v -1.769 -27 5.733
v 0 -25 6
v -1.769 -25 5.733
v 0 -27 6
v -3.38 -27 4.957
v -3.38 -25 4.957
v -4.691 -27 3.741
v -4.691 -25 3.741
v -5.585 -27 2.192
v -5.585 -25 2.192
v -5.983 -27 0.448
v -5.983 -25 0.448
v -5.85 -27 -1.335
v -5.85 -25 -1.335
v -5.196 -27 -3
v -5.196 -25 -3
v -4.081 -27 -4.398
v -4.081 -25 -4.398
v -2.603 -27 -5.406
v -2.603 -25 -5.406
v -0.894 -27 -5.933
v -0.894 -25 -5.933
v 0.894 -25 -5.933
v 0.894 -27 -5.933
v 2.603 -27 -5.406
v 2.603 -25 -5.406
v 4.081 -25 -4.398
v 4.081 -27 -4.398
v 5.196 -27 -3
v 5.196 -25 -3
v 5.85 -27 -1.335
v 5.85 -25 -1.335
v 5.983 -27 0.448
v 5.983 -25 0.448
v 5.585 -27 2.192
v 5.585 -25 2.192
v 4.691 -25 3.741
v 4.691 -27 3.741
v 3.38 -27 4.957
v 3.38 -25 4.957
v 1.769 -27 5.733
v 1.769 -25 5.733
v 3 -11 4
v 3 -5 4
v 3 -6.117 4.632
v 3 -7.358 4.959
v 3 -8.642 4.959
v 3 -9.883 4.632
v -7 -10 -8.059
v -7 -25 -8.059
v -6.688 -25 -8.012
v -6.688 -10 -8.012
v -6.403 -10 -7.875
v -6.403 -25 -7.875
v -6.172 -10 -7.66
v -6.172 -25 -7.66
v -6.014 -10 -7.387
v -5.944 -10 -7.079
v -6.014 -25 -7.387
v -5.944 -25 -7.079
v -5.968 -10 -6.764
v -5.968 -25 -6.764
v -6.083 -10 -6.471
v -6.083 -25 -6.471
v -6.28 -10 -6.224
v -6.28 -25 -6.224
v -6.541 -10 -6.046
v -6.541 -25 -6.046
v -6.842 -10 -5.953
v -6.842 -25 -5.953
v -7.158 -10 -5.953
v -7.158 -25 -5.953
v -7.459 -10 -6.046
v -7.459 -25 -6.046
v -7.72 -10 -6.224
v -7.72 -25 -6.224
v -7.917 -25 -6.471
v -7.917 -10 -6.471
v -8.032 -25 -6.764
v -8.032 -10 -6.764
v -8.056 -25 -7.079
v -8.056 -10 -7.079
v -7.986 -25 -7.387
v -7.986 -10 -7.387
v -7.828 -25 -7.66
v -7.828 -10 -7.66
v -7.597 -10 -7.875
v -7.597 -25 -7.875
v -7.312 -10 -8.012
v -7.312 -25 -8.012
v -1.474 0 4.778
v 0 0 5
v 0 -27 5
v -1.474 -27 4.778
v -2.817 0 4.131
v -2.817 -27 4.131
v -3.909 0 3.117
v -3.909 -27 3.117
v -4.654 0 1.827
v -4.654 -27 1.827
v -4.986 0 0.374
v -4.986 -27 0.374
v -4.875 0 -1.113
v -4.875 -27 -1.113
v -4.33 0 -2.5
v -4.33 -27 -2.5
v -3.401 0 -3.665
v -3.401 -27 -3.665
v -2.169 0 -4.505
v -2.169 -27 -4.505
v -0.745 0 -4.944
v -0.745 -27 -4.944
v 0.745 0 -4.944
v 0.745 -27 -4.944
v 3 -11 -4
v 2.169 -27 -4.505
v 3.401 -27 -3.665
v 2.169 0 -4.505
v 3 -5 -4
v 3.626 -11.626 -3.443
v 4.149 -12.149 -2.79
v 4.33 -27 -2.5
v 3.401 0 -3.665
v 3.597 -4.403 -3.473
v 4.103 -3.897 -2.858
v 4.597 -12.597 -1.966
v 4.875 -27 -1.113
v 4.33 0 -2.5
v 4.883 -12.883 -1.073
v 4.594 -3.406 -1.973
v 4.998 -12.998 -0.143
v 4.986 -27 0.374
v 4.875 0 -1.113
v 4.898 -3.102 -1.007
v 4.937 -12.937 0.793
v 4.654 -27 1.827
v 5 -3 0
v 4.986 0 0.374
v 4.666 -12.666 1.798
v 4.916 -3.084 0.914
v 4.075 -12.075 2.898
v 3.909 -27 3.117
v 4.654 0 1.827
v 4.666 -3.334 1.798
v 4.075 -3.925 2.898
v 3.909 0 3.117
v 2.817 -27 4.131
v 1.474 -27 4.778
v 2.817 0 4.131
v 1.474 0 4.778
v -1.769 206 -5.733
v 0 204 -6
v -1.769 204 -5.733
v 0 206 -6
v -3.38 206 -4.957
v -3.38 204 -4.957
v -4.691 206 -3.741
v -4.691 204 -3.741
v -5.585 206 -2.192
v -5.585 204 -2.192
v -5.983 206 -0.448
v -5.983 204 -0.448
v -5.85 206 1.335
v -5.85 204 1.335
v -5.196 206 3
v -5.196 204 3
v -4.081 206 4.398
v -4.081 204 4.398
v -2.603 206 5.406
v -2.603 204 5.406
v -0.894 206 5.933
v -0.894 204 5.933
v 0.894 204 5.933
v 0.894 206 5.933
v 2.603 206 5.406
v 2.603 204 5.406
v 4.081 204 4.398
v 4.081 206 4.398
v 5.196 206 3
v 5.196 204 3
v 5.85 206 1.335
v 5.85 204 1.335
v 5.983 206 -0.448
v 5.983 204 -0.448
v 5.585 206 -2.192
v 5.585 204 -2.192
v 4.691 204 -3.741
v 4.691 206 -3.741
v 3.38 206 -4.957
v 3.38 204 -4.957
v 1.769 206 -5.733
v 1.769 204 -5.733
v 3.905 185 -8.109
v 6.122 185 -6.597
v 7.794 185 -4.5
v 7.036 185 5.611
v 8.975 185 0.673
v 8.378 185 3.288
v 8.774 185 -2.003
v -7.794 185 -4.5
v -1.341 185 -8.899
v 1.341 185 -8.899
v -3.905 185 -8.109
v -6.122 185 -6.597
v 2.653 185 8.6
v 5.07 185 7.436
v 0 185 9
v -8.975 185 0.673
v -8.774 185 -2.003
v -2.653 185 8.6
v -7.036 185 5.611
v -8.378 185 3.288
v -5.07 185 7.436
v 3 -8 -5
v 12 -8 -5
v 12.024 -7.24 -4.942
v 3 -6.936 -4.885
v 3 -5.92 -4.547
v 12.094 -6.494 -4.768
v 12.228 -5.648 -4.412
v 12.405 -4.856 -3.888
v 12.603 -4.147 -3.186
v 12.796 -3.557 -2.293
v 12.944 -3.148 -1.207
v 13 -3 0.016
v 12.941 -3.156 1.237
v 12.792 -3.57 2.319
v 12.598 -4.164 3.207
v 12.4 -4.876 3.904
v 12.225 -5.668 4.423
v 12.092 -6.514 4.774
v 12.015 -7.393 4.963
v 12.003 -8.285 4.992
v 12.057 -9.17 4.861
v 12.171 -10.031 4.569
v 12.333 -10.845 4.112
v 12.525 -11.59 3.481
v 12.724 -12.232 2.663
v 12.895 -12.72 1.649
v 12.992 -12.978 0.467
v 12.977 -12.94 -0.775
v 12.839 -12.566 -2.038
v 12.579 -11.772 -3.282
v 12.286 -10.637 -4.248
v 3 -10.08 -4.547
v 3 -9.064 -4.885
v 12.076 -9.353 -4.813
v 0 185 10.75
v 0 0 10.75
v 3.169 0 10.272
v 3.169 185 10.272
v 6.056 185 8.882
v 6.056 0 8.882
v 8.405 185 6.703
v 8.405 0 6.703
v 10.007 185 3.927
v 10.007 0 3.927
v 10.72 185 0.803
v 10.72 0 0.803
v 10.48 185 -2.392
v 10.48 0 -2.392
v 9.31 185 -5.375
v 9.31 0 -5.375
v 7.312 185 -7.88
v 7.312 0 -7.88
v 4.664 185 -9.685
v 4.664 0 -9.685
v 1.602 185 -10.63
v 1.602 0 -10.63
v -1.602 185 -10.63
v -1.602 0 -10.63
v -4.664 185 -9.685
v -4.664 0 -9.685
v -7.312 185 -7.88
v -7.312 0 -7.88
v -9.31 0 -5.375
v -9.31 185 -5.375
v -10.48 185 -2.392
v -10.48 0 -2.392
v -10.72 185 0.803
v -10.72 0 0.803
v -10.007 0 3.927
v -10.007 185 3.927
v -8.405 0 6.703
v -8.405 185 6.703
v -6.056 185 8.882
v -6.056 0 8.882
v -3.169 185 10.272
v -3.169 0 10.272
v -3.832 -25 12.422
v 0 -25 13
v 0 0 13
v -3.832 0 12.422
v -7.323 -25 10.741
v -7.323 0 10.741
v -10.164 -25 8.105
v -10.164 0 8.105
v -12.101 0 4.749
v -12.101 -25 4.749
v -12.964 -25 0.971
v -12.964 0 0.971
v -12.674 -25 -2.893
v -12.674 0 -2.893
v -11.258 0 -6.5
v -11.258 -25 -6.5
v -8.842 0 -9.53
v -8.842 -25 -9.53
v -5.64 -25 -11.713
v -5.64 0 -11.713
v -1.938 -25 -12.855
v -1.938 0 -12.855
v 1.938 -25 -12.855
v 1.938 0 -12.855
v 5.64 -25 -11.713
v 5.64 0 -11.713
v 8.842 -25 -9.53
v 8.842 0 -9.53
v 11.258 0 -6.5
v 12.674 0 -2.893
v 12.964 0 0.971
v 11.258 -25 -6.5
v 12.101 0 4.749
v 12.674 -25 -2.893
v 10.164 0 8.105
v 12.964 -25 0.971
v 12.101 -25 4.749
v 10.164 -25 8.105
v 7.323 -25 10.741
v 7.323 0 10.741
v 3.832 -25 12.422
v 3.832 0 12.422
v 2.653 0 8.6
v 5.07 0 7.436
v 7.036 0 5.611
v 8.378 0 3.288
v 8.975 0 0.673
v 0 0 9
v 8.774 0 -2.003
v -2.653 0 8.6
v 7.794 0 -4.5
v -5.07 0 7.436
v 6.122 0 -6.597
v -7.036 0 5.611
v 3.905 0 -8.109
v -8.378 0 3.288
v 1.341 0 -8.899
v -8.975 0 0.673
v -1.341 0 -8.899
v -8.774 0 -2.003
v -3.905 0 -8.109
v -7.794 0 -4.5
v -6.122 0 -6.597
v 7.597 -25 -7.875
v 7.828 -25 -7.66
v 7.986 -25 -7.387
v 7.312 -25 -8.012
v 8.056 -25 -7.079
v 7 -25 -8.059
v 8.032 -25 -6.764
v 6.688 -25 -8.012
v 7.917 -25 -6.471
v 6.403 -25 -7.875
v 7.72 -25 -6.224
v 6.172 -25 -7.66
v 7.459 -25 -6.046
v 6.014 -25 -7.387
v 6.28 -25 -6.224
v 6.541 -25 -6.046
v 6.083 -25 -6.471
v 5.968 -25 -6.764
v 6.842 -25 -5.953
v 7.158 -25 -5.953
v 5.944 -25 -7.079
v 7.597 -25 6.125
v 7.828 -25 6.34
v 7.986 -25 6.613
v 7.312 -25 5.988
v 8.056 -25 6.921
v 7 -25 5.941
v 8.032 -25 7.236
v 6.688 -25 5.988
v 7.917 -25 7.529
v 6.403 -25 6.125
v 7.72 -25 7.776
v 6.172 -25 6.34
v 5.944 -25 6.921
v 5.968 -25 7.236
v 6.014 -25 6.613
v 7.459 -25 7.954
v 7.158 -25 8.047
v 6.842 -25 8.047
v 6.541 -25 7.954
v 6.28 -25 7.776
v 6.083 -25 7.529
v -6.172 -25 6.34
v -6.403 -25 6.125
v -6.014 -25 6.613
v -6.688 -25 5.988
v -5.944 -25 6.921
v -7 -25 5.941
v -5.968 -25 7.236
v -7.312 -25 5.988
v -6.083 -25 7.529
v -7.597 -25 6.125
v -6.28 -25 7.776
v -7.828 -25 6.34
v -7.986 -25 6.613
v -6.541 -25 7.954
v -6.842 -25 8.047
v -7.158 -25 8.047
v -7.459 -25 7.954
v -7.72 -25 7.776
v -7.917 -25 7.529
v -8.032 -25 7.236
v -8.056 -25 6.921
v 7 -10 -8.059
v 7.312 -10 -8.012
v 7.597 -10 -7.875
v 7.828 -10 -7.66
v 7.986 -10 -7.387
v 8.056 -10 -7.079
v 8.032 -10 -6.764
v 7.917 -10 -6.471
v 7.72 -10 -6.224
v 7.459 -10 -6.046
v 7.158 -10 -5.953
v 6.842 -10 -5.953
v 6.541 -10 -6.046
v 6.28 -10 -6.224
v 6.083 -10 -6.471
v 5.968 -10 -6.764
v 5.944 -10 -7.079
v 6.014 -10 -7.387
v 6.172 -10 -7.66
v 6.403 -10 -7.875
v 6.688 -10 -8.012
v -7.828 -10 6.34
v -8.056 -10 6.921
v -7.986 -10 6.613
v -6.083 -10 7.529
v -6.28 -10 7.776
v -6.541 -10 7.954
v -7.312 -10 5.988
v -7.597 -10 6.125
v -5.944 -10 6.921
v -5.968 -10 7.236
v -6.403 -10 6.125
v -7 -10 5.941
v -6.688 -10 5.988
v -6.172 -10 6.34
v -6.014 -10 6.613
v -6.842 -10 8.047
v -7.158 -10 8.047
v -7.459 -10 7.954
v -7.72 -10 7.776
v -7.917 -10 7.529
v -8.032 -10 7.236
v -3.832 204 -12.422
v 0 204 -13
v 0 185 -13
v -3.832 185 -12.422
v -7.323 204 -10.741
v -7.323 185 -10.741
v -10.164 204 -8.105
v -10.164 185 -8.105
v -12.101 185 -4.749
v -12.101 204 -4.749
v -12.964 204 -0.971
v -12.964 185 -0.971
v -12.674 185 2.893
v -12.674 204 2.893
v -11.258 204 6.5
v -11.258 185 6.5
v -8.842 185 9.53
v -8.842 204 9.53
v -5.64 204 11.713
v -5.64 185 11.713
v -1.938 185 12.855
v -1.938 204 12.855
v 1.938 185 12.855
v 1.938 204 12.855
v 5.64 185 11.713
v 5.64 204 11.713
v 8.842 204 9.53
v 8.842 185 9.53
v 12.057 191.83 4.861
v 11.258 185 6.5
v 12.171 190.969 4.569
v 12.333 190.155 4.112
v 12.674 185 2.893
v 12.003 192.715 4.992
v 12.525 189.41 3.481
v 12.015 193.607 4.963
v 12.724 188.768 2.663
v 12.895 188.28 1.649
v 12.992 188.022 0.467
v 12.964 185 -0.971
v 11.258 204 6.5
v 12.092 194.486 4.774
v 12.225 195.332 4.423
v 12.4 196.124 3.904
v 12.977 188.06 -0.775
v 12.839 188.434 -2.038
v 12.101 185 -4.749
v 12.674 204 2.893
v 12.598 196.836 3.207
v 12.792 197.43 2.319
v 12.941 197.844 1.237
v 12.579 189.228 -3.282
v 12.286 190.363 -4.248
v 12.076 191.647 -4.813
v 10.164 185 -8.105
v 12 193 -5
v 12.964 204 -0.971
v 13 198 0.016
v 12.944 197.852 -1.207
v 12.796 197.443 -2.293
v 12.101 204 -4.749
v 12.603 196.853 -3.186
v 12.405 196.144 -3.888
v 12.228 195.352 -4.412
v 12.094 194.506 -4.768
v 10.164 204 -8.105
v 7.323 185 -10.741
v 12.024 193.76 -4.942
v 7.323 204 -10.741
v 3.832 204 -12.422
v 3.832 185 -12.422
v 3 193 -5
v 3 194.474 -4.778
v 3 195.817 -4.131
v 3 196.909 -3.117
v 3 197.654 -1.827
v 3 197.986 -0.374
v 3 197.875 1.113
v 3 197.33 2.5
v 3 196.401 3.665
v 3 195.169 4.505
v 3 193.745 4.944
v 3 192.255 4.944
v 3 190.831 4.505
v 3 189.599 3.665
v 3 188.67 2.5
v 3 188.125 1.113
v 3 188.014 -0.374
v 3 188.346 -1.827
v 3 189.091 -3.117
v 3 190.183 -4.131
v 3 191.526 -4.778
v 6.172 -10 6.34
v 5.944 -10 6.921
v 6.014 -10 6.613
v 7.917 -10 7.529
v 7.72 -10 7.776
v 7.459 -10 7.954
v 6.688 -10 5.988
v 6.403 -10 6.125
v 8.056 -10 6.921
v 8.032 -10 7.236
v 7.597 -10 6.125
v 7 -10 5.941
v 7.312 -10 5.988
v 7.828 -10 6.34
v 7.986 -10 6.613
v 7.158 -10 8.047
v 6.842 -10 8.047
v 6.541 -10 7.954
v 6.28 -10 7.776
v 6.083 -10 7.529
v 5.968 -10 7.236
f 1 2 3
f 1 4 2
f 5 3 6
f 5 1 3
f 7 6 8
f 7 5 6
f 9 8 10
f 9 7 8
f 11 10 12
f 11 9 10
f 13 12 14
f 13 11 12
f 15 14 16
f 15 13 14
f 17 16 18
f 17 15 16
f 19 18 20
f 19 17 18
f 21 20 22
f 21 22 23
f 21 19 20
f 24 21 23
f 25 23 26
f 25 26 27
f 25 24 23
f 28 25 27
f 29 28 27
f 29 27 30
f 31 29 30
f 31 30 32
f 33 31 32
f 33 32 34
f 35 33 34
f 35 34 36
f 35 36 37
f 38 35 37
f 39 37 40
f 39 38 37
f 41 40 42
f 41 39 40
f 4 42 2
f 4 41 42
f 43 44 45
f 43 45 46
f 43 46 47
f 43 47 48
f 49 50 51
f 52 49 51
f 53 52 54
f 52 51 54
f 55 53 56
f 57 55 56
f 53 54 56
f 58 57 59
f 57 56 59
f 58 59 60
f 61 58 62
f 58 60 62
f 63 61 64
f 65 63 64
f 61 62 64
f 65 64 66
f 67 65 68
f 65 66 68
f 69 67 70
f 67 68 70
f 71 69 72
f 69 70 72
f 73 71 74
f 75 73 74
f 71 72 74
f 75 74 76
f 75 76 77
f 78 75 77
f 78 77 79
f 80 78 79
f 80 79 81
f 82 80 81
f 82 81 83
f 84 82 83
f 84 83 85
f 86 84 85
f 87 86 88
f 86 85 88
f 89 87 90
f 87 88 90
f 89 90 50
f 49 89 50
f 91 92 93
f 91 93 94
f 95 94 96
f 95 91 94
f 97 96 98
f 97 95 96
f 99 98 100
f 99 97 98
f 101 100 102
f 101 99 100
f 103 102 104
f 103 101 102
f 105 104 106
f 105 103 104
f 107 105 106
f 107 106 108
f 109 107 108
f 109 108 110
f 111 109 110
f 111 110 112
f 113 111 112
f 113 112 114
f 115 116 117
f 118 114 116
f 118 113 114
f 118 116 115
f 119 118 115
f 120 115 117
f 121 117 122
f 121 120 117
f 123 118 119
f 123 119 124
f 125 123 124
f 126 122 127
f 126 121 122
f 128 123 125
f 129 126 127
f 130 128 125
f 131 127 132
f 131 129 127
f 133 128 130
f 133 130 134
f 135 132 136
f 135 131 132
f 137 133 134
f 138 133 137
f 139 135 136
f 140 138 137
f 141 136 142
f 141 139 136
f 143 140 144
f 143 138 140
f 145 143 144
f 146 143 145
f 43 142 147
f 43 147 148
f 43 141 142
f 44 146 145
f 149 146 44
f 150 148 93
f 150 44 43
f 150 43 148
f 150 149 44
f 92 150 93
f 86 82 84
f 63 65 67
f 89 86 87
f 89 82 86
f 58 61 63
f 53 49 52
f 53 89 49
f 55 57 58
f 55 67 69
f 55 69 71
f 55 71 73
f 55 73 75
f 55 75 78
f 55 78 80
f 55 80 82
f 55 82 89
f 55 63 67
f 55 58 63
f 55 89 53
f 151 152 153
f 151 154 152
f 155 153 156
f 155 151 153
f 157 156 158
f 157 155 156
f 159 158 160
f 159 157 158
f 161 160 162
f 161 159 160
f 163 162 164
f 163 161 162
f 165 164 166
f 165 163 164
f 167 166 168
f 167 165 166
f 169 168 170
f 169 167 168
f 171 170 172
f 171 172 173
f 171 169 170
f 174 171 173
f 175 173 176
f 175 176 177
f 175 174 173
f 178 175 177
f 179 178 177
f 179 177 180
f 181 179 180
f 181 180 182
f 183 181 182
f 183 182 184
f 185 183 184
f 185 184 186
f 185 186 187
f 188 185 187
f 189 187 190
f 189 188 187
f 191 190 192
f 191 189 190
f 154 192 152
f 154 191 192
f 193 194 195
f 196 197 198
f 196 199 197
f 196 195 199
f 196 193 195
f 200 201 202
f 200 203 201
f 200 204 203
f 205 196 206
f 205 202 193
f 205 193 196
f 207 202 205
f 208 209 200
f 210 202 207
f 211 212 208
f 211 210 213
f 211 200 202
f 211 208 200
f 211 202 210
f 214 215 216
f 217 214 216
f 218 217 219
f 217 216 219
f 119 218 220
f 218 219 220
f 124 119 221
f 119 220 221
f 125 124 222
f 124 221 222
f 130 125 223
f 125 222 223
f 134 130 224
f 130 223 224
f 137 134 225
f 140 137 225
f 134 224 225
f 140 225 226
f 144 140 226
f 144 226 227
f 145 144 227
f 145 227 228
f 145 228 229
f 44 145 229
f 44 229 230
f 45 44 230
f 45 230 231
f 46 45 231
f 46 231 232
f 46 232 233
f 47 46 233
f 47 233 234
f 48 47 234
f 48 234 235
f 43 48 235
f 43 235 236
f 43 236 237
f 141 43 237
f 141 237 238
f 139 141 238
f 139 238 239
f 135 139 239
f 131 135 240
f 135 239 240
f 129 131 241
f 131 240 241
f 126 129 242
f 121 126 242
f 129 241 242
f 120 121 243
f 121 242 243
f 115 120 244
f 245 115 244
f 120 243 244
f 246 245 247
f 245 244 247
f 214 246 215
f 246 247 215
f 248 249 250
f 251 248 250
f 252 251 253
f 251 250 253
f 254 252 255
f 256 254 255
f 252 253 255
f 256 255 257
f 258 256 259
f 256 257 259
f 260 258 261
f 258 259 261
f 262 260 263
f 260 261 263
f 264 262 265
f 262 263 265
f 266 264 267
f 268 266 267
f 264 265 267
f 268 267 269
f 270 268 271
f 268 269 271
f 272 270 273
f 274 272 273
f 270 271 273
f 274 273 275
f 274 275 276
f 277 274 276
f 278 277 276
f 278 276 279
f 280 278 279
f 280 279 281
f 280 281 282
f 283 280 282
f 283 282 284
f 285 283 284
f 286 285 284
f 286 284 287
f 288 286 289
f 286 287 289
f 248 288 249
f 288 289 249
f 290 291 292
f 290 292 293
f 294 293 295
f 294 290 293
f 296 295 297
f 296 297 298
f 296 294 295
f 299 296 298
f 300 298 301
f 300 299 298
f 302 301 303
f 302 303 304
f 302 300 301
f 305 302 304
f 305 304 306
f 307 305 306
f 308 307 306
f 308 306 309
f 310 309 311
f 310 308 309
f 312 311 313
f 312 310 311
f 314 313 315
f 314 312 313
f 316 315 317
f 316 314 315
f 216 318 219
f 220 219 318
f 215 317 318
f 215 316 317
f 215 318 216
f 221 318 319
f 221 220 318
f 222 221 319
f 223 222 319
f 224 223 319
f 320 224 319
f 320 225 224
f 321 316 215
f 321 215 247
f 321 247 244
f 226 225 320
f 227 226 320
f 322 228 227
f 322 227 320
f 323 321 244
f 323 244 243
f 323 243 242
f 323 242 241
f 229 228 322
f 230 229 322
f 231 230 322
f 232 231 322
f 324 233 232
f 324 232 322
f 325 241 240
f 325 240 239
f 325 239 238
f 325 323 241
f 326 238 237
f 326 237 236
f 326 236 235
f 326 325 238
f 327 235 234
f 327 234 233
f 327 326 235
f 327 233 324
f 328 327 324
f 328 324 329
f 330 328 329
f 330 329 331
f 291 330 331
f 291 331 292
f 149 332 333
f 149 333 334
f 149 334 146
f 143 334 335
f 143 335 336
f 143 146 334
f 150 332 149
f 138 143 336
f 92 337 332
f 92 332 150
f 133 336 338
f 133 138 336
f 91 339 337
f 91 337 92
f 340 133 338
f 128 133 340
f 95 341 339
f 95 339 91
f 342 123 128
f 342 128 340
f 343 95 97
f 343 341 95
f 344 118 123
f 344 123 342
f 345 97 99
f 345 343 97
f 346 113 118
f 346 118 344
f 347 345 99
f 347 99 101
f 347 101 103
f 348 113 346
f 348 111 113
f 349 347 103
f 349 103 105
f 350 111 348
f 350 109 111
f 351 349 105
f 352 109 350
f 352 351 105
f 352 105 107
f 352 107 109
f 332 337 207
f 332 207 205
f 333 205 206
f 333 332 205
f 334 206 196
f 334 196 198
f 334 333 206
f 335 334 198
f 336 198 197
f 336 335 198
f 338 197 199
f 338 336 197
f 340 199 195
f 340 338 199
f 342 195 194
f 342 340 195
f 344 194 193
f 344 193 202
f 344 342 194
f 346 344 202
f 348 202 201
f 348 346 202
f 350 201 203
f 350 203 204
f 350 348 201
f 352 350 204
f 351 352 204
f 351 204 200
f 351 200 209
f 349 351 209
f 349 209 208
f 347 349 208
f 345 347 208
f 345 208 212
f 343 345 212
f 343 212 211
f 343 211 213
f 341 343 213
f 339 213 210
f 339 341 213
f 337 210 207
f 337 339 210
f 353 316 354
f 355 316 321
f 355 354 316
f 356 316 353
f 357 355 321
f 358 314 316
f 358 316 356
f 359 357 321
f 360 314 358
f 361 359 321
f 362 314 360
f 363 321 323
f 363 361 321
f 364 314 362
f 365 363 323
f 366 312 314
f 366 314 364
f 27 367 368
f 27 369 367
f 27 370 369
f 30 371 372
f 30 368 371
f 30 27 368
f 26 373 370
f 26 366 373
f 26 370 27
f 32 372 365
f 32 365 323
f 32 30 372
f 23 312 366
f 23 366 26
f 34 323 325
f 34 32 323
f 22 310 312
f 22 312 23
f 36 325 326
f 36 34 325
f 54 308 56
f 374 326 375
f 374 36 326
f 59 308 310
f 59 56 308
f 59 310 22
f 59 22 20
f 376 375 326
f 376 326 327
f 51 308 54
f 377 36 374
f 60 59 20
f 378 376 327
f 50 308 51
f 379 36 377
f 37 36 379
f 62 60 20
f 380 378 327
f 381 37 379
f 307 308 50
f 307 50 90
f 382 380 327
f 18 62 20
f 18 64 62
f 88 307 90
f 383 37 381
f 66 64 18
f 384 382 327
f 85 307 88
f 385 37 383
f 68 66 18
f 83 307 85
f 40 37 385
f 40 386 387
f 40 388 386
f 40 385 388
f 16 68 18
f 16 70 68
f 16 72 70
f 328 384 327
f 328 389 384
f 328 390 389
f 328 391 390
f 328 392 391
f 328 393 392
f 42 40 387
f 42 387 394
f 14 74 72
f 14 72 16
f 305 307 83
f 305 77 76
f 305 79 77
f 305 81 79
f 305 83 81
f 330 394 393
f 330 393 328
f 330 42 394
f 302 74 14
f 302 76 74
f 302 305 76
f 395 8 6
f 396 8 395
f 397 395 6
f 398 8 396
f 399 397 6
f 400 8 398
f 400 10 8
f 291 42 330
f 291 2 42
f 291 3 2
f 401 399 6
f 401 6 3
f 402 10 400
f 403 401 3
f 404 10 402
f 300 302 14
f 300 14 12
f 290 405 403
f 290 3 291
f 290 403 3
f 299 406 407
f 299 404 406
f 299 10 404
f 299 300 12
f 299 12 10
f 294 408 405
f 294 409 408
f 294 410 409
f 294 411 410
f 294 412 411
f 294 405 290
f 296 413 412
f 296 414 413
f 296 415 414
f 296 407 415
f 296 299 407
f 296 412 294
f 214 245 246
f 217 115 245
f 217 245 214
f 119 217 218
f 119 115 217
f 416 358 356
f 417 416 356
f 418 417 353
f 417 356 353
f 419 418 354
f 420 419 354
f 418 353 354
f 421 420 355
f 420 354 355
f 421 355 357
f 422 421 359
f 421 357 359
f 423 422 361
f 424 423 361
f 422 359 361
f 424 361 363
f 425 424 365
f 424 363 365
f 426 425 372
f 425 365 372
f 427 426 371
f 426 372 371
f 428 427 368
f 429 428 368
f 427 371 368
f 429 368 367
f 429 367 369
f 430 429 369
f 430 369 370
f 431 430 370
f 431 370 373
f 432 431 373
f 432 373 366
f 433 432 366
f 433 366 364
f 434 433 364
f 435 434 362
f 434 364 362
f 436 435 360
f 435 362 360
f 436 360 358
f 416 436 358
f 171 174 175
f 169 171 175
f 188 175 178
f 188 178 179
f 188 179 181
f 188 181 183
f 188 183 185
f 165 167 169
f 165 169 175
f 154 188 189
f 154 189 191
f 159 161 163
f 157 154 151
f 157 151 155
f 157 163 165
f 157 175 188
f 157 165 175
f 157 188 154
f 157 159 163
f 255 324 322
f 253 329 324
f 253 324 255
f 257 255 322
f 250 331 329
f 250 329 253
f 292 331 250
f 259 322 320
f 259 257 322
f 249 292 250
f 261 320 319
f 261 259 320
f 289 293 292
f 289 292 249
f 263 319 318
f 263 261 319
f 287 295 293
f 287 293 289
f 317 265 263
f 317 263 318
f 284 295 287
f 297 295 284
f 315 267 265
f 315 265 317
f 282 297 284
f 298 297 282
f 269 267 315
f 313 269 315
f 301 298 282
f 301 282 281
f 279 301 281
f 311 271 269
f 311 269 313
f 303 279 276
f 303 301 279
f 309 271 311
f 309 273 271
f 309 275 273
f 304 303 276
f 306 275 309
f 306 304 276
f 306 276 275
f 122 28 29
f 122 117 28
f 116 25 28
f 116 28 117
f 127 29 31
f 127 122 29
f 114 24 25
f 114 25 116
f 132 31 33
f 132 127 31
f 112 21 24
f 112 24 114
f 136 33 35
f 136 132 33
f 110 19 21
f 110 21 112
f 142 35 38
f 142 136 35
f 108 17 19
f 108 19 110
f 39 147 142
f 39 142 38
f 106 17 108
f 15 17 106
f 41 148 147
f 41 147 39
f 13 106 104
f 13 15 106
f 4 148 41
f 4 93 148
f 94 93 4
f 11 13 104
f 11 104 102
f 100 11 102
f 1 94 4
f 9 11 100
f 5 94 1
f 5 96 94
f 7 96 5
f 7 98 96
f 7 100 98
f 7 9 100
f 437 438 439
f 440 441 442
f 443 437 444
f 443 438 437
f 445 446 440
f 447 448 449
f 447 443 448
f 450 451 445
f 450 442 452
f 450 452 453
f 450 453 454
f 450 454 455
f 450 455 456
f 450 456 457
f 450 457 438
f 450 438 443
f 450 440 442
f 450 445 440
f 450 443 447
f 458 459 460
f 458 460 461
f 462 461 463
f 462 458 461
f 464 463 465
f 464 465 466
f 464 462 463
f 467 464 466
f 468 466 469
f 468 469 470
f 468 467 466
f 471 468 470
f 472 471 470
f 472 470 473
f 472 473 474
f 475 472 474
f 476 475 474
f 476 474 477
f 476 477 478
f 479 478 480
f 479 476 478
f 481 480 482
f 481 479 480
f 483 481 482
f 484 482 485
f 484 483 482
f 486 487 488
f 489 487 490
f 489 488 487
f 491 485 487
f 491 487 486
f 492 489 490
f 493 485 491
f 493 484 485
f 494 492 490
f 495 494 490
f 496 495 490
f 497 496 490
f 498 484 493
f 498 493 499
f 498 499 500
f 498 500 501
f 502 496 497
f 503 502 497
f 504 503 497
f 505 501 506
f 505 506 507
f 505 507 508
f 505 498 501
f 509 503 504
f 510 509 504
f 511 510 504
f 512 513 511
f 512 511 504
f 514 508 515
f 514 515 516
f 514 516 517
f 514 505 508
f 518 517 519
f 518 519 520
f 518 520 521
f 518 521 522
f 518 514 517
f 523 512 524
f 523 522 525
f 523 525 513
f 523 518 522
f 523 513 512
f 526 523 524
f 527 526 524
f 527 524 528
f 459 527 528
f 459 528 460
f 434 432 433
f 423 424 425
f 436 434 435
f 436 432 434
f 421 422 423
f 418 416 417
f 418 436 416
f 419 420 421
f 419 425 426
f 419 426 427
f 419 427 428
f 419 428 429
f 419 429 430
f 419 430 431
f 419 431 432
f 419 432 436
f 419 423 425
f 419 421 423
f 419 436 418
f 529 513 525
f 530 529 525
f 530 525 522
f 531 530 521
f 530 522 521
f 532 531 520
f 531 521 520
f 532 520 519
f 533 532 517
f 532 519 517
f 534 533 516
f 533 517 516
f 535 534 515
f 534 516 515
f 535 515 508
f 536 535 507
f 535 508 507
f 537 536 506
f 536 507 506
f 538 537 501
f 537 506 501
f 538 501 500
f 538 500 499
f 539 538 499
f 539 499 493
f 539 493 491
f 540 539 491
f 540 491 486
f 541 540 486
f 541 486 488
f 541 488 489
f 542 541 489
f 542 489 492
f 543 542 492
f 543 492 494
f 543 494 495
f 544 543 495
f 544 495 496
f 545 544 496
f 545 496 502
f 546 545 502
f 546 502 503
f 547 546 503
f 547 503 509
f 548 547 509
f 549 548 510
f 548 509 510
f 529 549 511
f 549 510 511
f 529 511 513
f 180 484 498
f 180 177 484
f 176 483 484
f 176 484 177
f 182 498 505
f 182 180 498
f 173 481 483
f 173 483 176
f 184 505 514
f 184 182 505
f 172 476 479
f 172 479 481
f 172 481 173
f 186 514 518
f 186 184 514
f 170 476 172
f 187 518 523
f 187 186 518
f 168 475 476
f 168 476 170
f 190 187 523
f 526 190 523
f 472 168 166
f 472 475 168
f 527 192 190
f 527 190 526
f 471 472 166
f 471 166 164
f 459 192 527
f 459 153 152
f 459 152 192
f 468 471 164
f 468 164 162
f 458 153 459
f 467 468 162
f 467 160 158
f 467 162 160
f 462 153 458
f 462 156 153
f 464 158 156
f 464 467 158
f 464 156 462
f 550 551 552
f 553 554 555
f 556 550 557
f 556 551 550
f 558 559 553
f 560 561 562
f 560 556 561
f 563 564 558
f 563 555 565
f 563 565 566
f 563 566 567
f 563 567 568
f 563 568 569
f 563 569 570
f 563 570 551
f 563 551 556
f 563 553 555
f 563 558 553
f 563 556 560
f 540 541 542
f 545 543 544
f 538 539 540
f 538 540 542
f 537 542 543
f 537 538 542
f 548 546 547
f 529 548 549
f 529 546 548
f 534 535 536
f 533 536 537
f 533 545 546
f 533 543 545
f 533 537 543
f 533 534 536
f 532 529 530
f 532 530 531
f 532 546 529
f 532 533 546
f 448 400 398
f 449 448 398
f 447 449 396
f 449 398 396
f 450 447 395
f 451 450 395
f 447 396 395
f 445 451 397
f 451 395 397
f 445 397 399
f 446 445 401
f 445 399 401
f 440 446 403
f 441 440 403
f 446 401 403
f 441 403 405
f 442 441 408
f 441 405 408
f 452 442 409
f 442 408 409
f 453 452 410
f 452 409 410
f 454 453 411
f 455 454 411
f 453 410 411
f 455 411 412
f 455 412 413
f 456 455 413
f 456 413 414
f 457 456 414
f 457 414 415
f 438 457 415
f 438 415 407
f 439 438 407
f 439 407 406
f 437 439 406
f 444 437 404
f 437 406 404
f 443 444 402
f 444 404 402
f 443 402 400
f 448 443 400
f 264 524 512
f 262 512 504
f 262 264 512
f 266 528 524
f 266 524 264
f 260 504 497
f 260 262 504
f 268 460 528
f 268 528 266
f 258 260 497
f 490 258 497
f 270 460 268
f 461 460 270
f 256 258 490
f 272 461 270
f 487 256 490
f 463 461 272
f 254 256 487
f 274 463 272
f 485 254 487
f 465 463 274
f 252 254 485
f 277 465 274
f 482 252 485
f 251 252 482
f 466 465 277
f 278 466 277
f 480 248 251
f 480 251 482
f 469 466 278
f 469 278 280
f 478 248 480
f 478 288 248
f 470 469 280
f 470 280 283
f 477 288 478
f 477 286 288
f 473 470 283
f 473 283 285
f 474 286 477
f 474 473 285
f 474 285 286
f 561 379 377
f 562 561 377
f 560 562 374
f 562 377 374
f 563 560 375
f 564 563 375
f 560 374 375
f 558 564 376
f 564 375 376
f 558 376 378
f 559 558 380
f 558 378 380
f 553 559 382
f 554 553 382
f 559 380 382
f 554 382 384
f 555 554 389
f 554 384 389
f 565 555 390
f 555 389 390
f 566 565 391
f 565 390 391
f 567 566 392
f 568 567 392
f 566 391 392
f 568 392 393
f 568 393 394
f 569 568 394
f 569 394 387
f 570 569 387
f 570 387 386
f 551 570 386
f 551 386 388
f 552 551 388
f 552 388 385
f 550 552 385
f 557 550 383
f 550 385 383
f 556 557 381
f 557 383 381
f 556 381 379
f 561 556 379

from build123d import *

# Parameters (mm, degrees)
SKETCH_1_R          = 10.75
SKETCH_1_R_2        = 9
EXTRUDE_1_DEPTH     = 185
SKETCH_5_R          = 5
CUT_EXTRUDE_2_DEPTH = 10
SKETCH_6_R          = 1.058948346
CUT_EXTRUDE_3_DEPTH = 15


with BuildPart() as part:
    # 草图1 → 拉伸1 (new body)
    with BuildSketch(Plane(origin=(0, 0, 0), x_dir=(1, 0, 0), z_dir=(0, 1, 0))):
        with Locations(Location((0, 0, 0), (0, 0, 270))):
            Circle(SKETCH_1_R)
        with Locations(Location((0, 0, 0), (0, 0, 270))):
            Circle(SKETCH_1_R_2, mode=Mode.SUBTRACT)
    extrude(amount=EXTRUDE_1_DEPTH)

    # 草图3 → 旋转1 (revolve)
    with BuildSketch(Plane(origin=(0, 0, 0), x_dir=(0, 0, -1), z_dir=(1, 0, 0)), mode=Mode.PRIVATE) as revolve_1_sk:
        Polygon((0, 185), (-13, 185), (-13, 204), (-6, 204), (-6, 206), (0, 206), align=None)
    revolve(revolve_1_sk.sketch.rotate(Axis((0, 185, 0), (0, 1, 0)), 180), axis=Axis((0, 185, 0), (0, 1, 0)))

    # 草图4 → 旋转2 (revolve)
    with BuildSketch(Plane(origin=(0, 0, 0), x_dir=(0, 0, -1), z_dir=(1, 0, 0)), mode=Mode.PRIVATE) as revolve_2_sk:
        Polygon((5, 0), (13, 0), (13, -25), (6, -25), (6, -27), (5, -27), align=None)
    revolve(revolve_2_sk.sketch.rotate(Axis((0, 0, 0), (0, -1, 0)), 180), axis=Axis((0, 0, 0), (0, -1, 0)))

    # 草图5 → 拉伸2 (cut)
    with BuildSketch(Plane(origin=(13, 0, 0), x_dir=(0, 0, -1), z_dir=(1, 0, 0))):
        with Locations((0, 193)):
            Circle(SKETCH_5_R)
        with Locations((0, -8)):
            Circle(SKETCH_5_R)
    extrude(amount=-CUT_EXTRUDE_2_DEPTH, mode=Mode.SUBTRACT)

    # 草图6 → 拉伸3 (cut)
    with BuildSketch(Plane.XZ.offset(25)):
        with Locations(Location((7, 7, 0), (0, 0, 270))):
            Circle(SKETCH_6_R)
        with Locations(Location((-7, 7, 0), (0, 0, 270))):
            Circle(SKETCH_6_R)
        with Locations(Location((-7, -7, 0), (0, 0, 270))):
            Circle(SKETCH_6_R)
        with Locations(Location((7, -7, 0), (0, 0, 270))):
            Circle(SKETCH_6_R)
    extrude(amount=-CUT_EXTRUDE_3_DEPTH, mode=Mode.SUBTRACT)


solid = part.part
